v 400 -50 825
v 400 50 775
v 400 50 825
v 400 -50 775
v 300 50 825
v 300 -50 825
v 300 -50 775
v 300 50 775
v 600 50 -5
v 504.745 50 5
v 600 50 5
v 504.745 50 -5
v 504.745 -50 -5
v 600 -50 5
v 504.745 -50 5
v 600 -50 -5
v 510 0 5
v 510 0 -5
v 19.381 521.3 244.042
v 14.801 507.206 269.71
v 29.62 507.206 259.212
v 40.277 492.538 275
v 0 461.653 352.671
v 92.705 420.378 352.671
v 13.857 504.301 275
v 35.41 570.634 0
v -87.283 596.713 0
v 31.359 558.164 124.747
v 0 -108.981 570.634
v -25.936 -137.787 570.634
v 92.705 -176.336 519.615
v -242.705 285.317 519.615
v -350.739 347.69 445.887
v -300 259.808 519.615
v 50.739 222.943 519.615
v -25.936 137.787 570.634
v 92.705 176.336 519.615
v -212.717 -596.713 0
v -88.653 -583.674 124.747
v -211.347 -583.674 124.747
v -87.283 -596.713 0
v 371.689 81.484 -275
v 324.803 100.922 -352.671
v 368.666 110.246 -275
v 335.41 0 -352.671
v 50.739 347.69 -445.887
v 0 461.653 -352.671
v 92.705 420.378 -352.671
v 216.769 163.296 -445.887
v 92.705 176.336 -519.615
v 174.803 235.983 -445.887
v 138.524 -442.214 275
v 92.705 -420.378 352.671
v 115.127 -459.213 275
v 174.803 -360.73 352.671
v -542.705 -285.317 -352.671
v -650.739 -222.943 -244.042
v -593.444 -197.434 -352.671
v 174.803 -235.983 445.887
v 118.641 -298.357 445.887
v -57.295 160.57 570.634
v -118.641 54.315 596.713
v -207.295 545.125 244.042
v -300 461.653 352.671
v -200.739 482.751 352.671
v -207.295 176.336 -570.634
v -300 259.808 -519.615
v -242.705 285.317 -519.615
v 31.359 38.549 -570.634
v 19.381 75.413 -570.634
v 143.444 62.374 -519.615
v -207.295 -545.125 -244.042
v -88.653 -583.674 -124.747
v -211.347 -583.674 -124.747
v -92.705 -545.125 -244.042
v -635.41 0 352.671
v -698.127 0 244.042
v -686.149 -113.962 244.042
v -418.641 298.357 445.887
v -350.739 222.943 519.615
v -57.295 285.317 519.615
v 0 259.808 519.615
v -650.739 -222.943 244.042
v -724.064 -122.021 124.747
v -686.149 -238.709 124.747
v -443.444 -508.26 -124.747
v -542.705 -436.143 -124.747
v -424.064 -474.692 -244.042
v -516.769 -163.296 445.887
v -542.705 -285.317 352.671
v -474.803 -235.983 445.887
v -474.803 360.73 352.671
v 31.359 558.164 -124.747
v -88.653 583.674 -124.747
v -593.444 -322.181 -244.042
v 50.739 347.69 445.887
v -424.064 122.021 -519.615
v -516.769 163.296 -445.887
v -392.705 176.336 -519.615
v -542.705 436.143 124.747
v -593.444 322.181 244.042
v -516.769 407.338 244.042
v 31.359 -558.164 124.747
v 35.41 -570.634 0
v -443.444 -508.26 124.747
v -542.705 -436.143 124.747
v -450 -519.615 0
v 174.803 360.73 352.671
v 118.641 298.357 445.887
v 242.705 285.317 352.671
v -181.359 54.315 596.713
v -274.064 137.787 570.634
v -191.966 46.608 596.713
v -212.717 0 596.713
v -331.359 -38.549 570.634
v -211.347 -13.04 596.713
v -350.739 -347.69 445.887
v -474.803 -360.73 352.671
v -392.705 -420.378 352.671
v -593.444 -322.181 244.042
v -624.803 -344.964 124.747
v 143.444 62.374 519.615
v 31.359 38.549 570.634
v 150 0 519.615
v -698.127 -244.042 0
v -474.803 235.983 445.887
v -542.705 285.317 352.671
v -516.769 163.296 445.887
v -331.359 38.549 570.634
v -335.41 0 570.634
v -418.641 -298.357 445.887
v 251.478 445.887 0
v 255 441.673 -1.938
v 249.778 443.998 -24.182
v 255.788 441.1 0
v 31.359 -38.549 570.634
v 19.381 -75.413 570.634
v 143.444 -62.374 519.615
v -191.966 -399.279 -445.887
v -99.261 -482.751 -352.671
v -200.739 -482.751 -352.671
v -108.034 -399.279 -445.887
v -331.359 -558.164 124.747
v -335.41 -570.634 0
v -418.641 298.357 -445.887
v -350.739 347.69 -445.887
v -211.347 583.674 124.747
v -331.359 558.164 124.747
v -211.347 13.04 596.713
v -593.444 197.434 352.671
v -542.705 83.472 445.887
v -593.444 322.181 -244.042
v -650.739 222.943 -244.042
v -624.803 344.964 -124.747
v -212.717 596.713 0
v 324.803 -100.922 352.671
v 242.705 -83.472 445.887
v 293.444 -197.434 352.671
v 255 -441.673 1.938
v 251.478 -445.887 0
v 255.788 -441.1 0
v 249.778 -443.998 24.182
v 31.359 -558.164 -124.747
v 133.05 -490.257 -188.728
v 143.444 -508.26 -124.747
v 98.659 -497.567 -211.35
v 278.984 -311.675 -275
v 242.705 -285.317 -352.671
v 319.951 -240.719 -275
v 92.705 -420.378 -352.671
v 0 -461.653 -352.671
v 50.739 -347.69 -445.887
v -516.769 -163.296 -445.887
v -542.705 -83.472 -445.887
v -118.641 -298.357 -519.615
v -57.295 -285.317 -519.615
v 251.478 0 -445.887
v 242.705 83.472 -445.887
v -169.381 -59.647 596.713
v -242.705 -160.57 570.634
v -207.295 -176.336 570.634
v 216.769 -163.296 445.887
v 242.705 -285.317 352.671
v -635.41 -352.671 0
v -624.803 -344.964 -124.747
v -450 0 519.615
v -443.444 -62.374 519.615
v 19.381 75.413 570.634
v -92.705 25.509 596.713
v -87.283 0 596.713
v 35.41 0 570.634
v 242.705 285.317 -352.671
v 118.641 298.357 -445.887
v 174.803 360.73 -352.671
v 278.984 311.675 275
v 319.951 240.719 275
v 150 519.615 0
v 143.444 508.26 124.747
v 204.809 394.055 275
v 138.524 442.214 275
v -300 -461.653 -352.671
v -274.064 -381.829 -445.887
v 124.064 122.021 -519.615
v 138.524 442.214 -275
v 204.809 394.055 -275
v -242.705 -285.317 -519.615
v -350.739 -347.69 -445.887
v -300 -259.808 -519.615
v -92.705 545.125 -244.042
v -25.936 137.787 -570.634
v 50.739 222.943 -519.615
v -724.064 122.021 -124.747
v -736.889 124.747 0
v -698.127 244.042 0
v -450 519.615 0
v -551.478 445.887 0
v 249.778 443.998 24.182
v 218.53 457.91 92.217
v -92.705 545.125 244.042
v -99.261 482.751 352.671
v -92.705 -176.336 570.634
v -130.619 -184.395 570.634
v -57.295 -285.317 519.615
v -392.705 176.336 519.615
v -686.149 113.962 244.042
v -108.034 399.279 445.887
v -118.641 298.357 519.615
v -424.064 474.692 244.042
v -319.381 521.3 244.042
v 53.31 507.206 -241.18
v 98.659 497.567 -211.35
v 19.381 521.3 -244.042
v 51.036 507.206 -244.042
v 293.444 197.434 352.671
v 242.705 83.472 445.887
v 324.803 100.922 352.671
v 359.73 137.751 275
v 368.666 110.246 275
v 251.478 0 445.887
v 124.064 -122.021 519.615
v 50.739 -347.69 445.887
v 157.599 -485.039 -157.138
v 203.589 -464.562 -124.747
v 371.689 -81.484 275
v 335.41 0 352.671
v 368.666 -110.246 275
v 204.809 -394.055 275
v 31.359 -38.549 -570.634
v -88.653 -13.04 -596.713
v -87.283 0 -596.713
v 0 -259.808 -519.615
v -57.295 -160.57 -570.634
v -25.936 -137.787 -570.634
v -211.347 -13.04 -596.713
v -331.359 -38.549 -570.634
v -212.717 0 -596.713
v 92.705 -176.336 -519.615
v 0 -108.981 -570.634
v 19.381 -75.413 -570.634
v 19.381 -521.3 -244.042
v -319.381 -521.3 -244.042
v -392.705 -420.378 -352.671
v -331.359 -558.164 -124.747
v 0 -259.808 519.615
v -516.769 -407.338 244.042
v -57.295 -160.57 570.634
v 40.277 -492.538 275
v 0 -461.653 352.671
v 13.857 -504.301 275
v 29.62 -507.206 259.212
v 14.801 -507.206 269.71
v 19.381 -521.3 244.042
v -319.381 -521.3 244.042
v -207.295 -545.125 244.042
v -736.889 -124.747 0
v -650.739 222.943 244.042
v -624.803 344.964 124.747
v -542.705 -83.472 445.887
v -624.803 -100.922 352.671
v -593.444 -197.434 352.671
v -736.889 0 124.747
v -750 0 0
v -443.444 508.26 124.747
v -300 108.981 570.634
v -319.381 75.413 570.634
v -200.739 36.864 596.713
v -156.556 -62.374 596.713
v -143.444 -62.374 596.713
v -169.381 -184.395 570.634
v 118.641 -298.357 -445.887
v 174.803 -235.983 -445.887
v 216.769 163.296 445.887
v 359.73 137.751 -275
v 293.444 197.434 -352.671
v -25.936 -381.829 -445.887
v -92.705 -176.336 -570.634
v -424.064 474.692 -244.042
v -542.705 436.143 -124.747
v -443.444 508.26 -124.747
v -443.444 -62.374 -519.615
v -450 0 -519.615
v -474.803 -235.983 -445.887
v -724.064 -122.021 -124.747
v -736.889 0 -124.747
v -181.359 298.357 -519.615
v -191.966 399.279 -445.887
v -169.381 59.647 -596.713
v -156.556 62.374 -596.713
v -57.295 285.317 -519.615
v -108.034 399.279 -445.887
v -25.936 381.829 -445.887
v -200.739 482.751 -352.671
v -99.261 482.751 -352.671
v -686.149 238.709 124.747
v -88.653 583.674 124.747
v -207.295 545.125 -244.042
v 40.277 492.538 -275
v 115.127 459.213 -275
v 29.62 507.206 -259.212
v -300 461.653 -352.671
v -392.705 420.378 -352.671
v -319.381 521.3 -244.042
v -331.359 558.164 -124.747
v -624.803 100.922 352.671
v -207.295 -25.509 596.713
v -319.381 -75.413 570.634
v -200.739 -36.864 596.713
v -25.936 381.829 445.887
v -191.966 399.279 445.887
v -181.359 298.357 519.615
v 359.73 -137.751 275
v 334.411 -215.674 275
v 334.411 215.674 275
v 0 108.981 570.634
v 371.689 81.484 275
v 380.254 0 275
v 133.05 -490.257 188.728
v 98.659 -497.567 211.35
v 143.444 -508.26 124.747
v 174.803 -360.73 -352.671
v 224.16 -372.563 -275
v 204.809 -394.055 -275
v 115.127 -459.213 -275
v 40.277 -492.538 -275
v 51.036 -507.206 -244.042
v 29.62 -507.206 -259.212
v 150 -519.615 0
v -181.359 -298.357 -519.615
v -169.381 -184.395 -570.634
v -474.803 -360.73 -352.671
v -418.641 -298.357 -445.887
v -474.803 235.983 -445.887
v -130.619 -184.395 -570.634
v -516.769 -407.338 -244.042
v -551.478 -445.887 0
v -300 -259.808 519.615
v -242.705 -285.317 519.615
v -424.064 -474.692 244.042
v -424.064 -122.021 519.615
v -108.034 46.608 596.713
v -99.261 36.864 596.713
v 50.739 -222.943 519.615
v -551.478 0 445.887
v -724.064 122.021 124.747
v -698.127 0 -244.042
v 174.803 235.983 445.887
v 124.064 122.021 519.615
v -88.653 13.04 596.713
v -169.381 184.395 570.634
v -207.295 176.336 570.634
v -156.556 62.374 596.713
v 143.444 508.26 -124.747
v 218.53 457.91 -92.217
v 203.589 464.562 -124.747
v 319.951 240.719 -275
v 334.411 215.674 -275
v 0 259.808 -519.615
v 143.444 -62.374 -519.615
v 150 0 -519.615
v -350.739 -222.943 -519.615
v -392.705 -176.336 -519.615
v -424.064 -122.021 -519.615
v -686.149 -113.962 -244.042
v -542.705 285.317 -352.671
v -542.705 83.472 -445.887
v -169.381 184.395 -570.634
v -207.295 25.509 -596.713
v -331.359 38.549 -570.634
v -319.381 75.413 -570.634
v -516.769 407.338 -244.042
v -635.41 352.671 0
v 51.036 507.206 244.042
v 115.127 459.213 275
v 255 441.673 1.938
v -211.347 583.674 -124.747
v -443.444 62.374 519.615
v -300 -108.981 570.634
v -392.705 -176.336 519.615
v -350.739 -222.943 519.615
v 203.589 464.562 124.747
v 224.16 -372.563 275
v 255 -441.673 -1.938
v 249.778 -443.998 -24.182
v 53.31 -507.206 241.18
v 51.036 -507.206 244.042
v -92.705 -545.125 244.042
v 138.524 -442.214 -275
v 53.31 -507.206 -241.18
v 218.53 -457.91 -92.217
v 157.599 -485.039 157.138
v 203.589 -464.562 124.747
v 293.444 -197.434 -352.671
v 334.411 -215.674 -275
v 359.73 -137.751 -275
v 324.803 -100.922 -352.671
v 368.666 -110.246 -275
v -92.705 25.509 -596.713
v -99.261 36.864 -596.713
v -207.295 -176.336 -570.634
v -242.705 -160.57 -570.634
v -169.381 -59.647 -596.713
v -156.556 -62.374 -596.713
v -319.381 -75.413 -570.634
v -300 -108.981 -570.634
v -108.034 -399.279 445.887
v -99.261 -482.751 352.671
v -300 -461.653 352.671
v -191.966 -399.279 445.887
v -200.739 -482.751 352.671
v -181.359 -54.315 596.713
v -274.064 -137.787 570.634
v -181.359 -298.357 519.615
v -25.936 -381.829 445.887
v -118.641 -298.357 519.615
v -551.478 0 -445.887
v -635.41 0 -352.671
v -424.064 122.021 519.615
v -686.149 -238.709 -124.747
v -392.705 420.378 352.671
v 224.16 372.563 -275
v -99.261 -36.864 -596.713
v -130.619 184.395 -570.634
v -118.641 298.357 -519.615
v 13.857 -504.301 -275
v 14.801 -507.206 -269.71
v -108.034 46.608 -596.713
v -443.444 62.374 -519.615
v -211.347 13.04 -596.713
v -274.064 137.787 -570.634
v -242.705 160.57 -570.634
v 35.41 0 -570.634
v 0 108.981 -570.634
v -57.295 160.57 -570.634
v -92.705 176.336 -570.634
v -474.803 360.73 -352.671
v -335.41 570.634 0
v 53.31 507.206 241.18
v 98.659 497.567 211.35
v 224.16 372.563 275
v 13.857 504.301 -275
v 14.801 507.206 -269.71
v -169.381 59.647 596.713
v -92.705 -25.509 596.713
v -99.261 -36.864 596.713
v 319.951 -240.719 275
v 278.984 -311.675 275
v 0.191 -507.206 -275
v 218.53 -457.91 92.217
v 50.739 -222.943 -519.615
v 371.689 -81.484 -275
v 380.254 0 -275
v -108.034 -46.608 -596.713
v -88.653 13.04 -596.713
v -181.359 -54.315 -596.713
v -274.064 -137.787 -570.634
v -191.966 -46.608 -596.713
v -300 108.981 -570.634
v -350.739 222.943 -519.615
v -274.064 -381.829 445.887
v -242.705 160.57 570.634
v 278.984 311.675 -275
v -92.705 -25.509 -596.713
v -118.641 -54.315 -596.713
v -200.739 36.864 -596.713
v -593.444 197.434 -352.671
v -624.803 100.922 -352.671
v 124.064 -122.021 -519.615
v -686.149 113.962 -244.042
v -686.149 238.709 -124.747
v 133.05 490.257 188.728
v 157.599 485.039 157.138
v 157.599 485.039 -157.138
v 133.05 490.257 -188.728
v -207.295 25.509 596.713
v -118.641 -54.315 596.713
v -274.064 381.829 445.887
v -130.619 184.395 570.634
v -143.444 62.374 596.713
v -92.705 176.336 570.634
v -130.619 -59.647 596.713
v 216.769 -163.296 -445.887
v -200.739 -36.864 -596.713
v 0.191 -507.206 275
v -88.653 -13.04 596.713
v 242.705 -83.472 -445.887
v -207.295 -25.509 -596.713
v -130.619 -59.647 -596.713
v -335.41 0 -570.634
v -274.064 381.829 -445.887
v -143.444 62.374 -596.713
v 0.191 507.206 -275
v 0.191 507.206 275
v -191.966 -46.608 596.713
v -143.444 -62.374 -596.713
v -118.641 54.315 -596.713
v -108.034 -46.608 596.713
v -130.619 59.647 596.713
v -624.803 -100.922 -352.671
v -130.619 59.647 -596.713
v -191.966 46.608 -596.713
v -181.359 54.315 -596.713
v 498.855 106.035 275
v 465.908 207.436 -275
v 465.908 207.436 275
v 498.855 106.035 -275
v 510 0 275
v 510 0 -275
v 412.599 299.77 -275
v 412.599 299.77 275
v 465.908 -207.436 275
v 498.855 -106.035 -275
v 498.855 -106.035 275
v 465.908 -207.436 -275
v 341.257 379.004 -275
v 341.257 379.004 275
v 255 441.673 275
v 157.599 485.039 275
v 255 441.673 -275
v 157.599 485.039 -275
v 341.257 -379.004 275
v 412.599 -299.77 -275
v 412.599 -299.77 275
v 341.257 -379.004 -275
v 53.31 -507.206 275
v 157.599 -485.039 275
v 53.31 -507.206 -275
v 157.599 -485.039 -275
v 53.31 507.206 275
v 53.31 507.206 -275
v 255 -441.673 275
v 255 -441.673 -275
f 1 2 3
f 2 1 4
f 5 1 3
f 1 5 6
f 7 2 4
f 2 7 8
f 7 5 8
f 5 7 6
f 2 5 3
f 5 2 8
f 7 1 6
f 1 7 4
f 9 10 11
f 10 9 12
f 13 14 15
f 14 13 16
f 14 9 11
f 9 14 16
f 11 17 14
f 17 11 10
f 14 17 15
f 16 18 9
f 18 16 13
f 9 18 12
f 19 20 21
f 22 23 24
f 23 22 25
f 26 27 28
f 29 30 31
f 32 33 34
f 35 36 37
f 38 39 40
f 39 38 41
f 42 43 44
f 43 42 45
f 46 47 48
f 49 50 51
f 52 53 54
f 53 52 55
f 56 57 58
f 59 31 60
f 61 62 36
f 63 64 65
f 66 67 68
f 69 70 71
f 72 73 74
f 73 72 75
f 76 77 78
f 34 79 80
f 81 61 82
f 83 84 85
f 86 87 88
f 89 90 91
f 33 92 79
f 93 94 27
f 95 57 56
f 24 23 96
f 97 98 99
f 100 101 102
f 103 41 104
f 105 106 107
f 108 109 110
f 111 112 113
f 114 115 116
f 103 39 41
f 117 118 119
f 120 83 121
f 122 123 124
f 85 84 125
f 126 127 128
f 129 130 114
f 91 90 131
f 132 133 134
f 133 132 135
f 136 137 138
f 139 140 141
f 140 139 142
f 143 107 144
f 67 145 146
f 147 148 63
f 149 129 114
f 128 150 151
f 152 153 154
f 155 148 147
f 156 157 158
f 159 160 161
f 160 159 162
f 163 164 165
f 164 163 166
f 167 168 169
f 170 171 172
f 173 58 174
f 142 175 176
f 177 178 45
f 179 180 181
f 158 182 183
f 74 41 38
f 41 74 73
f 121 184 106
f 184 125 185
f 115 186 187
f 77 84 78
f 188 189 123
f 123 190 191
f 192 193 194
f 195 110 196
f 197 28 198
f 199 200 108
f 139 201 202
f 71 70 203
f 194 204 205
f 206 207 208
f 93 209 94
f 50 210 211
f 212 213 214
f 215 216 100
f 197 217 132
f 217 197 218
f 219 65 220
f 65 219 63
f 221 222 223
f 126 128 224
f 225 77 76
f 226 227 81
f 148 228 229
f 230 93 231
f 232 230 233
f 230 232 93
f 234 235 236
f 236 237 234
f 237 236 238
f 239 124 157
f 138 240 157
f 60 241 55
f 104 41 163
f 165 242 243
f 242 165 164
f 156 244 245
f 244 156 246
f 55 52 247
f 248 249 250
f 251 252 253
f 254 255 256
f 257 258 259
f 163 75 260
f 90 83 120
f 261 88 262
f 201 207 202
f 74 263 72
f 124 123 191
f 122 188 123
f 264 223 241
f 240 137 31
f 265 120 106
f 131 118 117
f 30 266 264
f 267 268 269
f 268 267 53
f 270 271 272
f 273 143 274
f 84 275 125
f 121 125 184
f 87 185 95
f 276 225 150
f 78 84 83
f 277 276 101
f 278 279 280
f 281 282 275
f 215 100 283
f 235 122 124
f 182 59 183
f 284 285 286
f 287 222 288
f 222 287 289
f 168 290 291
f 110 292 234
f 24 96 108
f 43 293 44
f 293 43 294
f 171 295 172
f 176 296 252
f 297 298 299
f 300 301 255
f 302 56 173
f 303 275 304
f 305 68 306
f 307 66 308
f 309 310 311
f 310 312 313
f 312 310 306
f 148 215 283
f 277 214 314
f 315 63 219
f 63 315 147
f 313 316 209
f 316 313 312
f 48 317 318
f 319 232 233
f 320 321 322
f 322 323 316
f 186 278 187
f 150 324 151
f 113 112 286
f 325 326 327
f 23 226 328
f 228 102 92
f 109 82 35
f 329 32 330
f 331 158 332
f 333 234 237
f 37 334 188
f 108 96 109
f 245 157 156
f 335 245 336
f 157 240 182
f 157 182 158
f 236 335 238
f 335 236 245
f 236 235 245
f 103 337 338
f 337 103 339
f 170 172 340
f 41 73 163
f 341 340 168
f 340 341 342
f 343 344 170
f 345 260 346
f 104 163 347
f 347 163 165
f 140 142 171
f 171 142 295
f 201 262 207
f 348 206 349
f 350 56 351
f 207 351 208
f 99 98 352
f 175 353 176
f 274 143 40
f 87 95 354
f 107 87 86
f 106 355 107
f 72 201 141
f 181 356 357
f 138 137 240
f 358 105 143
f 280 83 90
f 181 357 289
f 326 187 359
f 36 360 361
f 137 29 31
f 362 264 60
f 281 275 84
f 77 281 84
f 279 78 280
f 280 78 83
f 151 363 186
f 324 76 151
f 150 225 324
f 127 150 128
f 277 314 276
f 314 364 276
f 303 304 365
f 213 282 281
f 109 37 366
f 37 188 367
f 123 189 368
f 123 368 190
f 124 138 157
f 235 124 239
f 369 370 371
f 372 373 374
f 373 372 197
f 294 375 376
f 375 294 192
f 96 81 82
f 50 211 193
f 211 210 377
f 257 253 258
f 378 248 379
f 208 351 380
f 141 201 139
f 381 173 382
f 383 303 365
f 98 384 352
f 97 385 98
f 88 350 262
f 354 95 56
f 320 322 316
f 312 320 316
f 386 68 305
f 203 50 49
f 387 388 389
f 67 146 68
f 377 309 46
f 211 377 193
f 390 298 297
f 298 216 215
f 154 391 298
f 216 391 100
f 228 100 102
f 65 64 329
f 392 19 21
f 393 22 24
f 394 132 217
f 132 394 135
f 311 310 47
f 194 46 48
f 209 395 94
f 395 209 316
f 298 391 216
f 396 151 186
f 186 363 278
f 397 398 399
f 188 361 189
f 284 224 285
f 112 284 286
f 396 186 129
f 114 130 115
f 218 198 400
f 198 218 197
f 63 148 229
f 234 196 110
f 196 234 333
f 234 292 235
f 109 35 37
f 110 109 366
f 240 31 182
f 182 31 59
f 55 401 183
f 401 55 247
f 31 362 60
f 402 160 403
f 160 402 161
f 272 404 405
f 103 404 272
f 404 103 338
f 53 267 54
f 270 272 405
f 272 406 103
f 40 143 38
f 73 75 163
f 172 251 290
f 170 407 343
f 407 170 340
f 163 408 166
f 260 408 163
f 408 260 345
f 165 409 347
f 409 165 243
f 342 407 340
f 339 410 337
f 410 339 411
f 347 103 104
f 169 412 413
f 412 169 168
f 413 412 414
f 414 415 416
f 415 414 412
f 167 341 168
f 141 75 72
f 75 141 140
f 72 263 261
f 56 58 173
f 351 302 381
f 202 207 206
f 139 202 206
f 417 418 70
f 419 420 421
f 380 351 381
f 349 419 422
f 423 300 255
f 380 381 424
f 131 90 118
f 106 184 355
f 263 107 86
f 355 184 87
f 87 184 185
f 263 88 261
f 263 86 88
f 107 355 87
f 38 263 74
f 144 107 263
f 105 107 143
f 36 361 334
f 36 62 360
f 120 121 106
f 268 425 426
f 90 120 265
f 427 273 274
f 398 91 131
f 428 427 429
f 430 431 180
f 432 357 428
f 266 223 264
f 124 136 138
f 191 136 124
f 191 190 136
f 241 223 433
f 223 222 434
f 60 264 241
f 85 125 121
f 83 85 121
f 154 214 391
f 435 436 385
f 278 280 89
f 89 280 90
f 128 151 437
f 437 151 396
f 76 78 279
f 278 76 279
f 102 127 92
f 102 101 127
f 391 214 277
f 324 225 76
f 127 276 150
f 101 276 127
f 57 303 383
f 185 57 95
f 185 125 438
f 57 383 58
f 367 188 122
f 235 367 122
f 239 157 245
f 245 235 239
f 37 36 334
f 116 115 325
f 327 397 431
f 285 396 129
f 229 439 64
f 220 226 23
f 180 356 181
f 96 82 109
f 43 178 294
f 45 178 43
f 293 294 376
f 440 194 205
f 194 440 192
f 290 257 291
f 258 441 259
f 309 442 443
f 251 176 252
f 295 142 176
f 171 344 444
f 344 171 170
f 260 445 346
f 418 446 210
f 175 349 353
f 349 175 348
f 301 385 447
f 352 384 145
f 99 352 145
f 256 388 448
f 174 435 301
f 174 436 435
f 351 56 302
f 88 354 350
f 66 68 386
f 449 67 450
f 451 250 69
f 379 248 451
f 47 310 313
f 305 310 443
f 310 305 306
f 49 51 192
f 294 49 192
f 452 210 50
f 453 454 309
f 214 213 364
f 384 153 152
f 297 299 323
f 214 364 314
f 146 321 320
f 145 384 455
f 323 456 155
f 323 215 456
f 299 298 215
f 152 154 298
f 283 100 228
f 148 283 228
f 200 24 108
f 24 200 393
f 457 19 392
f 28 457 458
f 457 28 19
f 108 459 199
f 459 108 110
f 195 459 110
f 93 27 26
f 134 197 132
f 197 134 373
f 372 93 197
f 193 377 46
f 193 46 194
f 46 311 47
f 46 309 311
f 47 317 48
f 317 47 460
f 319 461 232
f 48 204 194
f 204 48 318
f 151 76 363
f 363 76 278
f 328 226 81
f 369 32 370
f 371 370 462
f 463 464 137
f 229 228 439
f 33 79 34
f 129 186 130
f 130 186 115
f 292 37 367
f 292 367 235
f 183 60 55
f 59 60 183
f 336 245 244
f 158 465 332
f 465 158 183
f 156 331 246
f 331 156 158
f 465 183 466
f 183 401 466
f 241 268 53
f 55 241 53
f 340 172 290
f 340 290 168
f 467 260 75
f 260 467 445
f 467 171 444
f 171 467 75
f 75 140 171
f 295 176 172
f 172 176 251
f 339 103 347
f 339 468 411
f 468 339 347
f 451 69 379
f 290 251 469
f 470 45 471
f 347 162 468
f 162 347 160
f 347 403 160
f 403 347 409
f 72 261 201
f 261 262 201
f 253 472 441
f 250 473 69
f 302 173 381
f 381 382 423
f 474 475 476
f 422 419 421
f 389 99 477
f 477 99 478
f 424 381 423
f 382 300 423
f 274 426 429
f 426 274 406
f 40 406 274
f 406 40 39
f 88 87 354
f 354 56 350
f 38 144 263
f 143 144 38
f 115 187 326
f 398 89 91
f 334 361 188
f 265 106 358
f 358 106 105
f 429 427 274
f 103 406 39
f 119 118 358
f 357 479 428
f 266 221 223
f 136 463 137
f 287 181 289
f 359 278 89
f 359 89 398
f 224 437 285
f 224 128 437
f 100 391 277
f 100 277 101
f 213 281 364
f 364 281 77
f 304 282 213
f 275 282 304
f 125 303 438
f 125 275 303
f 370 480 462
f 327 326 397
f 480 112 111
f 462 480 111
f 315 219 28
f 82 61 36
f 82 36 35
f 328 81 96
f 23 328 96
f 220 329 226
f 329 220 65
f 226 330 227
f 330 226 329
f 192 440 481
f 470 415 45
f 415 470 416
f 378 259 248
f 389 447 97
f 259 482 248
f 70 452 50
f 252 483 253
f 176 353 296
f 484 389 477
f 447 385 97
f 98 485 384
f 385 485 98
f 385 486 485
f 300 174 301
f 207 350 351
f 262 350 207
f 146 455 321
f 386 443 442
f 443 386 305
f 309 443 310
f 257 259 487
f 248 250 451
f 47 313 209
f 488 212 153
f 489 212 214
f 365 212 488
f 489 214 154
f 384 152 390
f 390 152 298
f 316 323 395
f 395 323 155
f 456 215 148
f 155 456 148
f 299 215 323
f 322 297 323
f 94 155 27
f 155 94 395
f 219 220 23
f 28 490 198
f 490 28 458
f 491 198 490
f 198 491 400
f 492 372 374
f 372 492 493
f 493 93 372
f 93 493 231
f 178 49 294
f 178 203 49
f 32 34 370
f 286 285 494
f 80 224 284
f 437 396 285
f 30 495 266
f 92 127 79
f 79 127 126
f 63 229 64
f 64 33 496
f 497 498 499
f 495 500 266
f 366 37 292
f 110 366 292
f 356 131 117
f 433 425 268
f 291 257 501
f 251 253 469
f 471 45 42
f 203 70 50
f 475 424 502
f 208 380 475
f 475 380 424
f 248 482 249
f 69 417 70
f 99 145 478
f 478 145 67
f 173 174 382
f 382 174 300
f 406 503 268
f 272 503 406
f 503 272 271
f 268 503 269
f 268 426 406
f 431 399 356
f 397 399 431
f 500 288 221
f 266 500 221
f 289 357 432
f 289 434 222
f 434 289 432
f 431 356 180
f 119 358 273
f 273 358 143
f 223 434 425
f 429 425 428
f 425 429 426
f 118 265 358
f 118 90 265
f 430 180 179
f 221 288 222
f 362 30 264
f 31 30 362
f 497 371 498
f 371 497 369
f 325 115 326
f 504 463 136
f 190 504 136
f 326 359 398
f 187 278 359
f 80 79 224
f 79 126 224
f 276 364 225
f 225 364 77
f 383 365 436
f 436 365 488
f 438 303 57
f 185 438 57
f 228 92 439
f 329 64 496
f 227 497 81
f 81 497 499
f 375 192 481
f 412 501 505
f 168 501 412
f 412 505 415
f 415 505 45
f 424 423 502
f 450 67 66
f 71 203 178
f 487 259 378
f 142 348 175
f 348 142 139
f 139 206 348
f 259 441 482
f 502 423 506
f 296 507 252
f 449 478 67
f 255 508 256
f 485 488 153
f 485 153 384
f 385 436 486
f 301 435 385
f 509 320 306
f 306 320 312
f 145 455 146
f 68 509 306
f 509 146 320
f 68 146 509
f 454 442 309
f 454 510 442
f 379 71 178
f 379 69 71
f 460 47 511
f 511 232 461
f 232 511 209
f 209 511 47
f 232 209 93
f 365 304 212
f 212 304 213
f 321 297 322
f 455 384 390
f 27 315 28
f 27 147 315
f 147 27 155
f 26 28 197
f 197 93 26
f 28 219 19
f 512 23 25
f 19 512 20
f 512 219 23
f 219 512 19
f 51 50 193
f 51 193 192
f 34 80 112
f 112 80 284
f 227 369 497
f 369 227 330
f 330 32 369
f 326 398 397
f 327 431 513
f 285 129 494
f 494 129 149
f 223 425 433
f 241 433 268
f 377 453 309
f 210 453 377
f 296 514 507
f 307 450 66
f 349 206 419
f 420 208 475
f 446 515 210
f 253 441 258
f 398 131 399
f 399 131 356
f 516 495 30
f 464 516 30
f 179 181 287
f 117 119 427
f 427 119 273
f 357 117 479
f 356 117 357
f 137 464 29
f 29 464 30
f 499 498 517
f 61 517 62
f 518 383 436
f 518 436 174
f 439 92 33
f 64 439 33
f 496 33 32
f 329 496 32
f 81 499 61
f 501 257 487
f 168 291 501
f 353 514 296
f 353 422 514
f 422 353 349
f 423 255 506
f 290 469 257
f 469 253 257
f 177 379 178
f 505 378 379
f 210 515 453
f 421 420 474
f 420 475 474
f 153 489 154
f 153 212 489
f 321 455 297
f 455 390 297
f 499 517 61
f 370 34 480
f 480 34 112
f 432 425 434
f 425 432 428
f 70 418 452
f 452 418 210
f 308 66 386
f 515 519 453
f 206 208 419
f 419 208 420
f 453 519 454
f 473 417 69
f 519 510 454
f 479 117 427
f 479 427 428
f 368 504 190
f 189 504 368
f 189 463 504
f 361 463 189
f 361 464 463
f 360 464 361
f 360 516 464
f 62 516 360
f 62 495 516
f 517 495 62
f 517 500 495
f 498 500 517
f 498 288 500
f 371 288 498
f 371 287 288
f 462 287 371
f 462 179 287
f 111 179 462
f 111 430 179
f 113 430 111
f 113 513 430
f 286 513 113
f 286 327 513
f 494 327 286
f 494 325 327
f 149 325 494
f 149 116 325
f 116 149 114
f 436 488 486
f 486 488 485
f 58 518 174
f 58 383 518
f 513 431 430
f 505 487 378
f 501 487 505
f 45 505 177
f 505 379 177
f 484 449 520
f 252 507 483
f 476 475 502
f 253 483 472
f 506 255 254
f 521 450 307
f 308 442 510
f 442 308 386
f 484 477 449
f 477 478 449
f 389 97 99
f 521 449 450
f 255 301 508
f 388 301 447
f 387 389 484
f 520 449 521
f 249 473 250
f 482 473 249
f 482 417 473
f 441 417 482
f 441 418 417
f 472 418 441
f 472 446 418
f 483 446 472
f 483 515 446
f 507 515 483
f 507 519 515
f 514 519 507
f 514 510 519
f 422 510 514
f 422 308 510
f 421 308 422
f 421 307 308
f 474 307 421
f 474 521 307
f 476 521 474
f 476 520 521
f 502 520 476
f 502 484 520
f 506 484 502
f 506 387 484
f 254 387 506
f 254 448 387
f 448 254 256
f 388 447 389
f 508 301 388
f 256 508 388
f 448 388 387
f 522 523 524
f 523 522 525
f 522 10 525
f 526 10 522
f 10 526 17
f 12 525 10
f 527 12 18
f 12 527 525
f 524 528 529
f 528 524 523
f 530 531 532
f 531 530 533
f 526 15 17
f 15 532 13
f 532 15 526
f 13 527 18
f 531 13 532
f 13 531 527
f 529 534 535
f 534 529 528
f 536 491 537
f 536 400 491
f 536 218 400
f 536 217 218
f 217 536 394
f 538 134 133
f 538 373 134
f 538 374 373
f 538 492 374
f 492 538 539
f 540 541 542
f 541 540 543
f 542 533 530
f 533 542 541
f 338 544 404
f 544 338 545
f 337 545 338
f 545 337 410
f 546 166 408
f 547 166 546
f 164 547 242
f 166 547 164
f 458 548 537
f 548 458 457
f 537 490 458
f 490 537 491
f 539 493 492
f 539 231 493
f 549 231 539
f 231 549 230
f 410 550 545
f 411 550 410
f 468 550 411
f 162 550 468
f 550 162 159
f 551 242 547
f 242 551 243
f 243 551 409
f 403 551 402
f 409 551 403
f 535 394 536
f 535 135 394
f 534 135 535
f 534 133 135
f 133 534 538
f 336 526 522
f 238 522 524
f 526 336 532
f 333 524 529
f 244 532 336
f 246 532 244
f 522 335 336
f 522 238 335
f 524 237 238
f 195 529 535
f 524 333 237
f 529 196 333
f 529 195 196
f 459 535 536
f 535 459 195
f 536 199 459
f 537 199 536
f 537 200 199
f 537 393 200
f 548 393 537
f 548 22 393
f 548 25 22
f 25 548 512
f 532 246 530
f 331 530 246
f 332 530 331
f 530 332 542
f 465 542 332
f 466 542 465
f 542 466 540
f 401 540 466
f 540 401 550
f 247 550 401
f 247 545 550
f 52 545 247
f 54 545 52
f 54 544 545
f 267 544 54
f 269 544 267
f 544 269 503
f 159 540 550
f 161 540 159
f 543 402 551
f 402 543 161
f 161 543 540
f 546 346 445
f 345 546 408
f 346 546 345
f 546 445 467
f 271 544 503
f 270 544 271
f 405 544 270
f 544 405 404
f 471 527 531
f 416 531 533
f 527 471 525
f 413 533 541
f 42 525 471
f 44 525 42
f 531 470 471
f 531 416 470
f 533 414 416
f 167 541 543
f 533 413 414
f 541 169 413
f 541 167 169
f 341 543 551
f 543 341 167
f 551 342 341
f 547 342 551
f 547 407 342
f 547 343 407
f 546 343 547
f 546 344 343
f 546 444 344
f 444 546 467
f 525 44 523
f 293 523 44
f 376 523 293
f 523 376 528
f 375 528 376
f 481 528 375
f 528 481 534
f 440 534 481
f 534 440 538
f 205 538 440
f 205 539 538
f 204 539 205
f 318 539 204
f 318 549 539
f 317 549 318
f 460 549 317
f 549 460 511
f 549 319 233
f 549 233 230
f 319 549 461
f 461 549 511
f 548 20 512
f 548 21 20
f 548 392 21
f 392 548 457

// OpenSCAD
union () {
  translate ([150, 0, 500]) {
    cube ([100, 100, -500], center=true);
  }
  translate ([250, 0, 0]) {
    cube ([100, 100, 75], center=true);
  }
  translate ([350, 0, 800]) {
    cube ([100, 100, 50], center=true);
  }
  translate ([450, 0, 0]) {
    cube ([100, 100, 506], center=true);
  }
  translate ([550, 0, 0]) {
    cube ([100, 100, 10], center=true);
  }
  translate ([-150, 0, 0]) {
    sphere (r=600);
  }
  cylinder (h=550, r=510, center=true);
}
